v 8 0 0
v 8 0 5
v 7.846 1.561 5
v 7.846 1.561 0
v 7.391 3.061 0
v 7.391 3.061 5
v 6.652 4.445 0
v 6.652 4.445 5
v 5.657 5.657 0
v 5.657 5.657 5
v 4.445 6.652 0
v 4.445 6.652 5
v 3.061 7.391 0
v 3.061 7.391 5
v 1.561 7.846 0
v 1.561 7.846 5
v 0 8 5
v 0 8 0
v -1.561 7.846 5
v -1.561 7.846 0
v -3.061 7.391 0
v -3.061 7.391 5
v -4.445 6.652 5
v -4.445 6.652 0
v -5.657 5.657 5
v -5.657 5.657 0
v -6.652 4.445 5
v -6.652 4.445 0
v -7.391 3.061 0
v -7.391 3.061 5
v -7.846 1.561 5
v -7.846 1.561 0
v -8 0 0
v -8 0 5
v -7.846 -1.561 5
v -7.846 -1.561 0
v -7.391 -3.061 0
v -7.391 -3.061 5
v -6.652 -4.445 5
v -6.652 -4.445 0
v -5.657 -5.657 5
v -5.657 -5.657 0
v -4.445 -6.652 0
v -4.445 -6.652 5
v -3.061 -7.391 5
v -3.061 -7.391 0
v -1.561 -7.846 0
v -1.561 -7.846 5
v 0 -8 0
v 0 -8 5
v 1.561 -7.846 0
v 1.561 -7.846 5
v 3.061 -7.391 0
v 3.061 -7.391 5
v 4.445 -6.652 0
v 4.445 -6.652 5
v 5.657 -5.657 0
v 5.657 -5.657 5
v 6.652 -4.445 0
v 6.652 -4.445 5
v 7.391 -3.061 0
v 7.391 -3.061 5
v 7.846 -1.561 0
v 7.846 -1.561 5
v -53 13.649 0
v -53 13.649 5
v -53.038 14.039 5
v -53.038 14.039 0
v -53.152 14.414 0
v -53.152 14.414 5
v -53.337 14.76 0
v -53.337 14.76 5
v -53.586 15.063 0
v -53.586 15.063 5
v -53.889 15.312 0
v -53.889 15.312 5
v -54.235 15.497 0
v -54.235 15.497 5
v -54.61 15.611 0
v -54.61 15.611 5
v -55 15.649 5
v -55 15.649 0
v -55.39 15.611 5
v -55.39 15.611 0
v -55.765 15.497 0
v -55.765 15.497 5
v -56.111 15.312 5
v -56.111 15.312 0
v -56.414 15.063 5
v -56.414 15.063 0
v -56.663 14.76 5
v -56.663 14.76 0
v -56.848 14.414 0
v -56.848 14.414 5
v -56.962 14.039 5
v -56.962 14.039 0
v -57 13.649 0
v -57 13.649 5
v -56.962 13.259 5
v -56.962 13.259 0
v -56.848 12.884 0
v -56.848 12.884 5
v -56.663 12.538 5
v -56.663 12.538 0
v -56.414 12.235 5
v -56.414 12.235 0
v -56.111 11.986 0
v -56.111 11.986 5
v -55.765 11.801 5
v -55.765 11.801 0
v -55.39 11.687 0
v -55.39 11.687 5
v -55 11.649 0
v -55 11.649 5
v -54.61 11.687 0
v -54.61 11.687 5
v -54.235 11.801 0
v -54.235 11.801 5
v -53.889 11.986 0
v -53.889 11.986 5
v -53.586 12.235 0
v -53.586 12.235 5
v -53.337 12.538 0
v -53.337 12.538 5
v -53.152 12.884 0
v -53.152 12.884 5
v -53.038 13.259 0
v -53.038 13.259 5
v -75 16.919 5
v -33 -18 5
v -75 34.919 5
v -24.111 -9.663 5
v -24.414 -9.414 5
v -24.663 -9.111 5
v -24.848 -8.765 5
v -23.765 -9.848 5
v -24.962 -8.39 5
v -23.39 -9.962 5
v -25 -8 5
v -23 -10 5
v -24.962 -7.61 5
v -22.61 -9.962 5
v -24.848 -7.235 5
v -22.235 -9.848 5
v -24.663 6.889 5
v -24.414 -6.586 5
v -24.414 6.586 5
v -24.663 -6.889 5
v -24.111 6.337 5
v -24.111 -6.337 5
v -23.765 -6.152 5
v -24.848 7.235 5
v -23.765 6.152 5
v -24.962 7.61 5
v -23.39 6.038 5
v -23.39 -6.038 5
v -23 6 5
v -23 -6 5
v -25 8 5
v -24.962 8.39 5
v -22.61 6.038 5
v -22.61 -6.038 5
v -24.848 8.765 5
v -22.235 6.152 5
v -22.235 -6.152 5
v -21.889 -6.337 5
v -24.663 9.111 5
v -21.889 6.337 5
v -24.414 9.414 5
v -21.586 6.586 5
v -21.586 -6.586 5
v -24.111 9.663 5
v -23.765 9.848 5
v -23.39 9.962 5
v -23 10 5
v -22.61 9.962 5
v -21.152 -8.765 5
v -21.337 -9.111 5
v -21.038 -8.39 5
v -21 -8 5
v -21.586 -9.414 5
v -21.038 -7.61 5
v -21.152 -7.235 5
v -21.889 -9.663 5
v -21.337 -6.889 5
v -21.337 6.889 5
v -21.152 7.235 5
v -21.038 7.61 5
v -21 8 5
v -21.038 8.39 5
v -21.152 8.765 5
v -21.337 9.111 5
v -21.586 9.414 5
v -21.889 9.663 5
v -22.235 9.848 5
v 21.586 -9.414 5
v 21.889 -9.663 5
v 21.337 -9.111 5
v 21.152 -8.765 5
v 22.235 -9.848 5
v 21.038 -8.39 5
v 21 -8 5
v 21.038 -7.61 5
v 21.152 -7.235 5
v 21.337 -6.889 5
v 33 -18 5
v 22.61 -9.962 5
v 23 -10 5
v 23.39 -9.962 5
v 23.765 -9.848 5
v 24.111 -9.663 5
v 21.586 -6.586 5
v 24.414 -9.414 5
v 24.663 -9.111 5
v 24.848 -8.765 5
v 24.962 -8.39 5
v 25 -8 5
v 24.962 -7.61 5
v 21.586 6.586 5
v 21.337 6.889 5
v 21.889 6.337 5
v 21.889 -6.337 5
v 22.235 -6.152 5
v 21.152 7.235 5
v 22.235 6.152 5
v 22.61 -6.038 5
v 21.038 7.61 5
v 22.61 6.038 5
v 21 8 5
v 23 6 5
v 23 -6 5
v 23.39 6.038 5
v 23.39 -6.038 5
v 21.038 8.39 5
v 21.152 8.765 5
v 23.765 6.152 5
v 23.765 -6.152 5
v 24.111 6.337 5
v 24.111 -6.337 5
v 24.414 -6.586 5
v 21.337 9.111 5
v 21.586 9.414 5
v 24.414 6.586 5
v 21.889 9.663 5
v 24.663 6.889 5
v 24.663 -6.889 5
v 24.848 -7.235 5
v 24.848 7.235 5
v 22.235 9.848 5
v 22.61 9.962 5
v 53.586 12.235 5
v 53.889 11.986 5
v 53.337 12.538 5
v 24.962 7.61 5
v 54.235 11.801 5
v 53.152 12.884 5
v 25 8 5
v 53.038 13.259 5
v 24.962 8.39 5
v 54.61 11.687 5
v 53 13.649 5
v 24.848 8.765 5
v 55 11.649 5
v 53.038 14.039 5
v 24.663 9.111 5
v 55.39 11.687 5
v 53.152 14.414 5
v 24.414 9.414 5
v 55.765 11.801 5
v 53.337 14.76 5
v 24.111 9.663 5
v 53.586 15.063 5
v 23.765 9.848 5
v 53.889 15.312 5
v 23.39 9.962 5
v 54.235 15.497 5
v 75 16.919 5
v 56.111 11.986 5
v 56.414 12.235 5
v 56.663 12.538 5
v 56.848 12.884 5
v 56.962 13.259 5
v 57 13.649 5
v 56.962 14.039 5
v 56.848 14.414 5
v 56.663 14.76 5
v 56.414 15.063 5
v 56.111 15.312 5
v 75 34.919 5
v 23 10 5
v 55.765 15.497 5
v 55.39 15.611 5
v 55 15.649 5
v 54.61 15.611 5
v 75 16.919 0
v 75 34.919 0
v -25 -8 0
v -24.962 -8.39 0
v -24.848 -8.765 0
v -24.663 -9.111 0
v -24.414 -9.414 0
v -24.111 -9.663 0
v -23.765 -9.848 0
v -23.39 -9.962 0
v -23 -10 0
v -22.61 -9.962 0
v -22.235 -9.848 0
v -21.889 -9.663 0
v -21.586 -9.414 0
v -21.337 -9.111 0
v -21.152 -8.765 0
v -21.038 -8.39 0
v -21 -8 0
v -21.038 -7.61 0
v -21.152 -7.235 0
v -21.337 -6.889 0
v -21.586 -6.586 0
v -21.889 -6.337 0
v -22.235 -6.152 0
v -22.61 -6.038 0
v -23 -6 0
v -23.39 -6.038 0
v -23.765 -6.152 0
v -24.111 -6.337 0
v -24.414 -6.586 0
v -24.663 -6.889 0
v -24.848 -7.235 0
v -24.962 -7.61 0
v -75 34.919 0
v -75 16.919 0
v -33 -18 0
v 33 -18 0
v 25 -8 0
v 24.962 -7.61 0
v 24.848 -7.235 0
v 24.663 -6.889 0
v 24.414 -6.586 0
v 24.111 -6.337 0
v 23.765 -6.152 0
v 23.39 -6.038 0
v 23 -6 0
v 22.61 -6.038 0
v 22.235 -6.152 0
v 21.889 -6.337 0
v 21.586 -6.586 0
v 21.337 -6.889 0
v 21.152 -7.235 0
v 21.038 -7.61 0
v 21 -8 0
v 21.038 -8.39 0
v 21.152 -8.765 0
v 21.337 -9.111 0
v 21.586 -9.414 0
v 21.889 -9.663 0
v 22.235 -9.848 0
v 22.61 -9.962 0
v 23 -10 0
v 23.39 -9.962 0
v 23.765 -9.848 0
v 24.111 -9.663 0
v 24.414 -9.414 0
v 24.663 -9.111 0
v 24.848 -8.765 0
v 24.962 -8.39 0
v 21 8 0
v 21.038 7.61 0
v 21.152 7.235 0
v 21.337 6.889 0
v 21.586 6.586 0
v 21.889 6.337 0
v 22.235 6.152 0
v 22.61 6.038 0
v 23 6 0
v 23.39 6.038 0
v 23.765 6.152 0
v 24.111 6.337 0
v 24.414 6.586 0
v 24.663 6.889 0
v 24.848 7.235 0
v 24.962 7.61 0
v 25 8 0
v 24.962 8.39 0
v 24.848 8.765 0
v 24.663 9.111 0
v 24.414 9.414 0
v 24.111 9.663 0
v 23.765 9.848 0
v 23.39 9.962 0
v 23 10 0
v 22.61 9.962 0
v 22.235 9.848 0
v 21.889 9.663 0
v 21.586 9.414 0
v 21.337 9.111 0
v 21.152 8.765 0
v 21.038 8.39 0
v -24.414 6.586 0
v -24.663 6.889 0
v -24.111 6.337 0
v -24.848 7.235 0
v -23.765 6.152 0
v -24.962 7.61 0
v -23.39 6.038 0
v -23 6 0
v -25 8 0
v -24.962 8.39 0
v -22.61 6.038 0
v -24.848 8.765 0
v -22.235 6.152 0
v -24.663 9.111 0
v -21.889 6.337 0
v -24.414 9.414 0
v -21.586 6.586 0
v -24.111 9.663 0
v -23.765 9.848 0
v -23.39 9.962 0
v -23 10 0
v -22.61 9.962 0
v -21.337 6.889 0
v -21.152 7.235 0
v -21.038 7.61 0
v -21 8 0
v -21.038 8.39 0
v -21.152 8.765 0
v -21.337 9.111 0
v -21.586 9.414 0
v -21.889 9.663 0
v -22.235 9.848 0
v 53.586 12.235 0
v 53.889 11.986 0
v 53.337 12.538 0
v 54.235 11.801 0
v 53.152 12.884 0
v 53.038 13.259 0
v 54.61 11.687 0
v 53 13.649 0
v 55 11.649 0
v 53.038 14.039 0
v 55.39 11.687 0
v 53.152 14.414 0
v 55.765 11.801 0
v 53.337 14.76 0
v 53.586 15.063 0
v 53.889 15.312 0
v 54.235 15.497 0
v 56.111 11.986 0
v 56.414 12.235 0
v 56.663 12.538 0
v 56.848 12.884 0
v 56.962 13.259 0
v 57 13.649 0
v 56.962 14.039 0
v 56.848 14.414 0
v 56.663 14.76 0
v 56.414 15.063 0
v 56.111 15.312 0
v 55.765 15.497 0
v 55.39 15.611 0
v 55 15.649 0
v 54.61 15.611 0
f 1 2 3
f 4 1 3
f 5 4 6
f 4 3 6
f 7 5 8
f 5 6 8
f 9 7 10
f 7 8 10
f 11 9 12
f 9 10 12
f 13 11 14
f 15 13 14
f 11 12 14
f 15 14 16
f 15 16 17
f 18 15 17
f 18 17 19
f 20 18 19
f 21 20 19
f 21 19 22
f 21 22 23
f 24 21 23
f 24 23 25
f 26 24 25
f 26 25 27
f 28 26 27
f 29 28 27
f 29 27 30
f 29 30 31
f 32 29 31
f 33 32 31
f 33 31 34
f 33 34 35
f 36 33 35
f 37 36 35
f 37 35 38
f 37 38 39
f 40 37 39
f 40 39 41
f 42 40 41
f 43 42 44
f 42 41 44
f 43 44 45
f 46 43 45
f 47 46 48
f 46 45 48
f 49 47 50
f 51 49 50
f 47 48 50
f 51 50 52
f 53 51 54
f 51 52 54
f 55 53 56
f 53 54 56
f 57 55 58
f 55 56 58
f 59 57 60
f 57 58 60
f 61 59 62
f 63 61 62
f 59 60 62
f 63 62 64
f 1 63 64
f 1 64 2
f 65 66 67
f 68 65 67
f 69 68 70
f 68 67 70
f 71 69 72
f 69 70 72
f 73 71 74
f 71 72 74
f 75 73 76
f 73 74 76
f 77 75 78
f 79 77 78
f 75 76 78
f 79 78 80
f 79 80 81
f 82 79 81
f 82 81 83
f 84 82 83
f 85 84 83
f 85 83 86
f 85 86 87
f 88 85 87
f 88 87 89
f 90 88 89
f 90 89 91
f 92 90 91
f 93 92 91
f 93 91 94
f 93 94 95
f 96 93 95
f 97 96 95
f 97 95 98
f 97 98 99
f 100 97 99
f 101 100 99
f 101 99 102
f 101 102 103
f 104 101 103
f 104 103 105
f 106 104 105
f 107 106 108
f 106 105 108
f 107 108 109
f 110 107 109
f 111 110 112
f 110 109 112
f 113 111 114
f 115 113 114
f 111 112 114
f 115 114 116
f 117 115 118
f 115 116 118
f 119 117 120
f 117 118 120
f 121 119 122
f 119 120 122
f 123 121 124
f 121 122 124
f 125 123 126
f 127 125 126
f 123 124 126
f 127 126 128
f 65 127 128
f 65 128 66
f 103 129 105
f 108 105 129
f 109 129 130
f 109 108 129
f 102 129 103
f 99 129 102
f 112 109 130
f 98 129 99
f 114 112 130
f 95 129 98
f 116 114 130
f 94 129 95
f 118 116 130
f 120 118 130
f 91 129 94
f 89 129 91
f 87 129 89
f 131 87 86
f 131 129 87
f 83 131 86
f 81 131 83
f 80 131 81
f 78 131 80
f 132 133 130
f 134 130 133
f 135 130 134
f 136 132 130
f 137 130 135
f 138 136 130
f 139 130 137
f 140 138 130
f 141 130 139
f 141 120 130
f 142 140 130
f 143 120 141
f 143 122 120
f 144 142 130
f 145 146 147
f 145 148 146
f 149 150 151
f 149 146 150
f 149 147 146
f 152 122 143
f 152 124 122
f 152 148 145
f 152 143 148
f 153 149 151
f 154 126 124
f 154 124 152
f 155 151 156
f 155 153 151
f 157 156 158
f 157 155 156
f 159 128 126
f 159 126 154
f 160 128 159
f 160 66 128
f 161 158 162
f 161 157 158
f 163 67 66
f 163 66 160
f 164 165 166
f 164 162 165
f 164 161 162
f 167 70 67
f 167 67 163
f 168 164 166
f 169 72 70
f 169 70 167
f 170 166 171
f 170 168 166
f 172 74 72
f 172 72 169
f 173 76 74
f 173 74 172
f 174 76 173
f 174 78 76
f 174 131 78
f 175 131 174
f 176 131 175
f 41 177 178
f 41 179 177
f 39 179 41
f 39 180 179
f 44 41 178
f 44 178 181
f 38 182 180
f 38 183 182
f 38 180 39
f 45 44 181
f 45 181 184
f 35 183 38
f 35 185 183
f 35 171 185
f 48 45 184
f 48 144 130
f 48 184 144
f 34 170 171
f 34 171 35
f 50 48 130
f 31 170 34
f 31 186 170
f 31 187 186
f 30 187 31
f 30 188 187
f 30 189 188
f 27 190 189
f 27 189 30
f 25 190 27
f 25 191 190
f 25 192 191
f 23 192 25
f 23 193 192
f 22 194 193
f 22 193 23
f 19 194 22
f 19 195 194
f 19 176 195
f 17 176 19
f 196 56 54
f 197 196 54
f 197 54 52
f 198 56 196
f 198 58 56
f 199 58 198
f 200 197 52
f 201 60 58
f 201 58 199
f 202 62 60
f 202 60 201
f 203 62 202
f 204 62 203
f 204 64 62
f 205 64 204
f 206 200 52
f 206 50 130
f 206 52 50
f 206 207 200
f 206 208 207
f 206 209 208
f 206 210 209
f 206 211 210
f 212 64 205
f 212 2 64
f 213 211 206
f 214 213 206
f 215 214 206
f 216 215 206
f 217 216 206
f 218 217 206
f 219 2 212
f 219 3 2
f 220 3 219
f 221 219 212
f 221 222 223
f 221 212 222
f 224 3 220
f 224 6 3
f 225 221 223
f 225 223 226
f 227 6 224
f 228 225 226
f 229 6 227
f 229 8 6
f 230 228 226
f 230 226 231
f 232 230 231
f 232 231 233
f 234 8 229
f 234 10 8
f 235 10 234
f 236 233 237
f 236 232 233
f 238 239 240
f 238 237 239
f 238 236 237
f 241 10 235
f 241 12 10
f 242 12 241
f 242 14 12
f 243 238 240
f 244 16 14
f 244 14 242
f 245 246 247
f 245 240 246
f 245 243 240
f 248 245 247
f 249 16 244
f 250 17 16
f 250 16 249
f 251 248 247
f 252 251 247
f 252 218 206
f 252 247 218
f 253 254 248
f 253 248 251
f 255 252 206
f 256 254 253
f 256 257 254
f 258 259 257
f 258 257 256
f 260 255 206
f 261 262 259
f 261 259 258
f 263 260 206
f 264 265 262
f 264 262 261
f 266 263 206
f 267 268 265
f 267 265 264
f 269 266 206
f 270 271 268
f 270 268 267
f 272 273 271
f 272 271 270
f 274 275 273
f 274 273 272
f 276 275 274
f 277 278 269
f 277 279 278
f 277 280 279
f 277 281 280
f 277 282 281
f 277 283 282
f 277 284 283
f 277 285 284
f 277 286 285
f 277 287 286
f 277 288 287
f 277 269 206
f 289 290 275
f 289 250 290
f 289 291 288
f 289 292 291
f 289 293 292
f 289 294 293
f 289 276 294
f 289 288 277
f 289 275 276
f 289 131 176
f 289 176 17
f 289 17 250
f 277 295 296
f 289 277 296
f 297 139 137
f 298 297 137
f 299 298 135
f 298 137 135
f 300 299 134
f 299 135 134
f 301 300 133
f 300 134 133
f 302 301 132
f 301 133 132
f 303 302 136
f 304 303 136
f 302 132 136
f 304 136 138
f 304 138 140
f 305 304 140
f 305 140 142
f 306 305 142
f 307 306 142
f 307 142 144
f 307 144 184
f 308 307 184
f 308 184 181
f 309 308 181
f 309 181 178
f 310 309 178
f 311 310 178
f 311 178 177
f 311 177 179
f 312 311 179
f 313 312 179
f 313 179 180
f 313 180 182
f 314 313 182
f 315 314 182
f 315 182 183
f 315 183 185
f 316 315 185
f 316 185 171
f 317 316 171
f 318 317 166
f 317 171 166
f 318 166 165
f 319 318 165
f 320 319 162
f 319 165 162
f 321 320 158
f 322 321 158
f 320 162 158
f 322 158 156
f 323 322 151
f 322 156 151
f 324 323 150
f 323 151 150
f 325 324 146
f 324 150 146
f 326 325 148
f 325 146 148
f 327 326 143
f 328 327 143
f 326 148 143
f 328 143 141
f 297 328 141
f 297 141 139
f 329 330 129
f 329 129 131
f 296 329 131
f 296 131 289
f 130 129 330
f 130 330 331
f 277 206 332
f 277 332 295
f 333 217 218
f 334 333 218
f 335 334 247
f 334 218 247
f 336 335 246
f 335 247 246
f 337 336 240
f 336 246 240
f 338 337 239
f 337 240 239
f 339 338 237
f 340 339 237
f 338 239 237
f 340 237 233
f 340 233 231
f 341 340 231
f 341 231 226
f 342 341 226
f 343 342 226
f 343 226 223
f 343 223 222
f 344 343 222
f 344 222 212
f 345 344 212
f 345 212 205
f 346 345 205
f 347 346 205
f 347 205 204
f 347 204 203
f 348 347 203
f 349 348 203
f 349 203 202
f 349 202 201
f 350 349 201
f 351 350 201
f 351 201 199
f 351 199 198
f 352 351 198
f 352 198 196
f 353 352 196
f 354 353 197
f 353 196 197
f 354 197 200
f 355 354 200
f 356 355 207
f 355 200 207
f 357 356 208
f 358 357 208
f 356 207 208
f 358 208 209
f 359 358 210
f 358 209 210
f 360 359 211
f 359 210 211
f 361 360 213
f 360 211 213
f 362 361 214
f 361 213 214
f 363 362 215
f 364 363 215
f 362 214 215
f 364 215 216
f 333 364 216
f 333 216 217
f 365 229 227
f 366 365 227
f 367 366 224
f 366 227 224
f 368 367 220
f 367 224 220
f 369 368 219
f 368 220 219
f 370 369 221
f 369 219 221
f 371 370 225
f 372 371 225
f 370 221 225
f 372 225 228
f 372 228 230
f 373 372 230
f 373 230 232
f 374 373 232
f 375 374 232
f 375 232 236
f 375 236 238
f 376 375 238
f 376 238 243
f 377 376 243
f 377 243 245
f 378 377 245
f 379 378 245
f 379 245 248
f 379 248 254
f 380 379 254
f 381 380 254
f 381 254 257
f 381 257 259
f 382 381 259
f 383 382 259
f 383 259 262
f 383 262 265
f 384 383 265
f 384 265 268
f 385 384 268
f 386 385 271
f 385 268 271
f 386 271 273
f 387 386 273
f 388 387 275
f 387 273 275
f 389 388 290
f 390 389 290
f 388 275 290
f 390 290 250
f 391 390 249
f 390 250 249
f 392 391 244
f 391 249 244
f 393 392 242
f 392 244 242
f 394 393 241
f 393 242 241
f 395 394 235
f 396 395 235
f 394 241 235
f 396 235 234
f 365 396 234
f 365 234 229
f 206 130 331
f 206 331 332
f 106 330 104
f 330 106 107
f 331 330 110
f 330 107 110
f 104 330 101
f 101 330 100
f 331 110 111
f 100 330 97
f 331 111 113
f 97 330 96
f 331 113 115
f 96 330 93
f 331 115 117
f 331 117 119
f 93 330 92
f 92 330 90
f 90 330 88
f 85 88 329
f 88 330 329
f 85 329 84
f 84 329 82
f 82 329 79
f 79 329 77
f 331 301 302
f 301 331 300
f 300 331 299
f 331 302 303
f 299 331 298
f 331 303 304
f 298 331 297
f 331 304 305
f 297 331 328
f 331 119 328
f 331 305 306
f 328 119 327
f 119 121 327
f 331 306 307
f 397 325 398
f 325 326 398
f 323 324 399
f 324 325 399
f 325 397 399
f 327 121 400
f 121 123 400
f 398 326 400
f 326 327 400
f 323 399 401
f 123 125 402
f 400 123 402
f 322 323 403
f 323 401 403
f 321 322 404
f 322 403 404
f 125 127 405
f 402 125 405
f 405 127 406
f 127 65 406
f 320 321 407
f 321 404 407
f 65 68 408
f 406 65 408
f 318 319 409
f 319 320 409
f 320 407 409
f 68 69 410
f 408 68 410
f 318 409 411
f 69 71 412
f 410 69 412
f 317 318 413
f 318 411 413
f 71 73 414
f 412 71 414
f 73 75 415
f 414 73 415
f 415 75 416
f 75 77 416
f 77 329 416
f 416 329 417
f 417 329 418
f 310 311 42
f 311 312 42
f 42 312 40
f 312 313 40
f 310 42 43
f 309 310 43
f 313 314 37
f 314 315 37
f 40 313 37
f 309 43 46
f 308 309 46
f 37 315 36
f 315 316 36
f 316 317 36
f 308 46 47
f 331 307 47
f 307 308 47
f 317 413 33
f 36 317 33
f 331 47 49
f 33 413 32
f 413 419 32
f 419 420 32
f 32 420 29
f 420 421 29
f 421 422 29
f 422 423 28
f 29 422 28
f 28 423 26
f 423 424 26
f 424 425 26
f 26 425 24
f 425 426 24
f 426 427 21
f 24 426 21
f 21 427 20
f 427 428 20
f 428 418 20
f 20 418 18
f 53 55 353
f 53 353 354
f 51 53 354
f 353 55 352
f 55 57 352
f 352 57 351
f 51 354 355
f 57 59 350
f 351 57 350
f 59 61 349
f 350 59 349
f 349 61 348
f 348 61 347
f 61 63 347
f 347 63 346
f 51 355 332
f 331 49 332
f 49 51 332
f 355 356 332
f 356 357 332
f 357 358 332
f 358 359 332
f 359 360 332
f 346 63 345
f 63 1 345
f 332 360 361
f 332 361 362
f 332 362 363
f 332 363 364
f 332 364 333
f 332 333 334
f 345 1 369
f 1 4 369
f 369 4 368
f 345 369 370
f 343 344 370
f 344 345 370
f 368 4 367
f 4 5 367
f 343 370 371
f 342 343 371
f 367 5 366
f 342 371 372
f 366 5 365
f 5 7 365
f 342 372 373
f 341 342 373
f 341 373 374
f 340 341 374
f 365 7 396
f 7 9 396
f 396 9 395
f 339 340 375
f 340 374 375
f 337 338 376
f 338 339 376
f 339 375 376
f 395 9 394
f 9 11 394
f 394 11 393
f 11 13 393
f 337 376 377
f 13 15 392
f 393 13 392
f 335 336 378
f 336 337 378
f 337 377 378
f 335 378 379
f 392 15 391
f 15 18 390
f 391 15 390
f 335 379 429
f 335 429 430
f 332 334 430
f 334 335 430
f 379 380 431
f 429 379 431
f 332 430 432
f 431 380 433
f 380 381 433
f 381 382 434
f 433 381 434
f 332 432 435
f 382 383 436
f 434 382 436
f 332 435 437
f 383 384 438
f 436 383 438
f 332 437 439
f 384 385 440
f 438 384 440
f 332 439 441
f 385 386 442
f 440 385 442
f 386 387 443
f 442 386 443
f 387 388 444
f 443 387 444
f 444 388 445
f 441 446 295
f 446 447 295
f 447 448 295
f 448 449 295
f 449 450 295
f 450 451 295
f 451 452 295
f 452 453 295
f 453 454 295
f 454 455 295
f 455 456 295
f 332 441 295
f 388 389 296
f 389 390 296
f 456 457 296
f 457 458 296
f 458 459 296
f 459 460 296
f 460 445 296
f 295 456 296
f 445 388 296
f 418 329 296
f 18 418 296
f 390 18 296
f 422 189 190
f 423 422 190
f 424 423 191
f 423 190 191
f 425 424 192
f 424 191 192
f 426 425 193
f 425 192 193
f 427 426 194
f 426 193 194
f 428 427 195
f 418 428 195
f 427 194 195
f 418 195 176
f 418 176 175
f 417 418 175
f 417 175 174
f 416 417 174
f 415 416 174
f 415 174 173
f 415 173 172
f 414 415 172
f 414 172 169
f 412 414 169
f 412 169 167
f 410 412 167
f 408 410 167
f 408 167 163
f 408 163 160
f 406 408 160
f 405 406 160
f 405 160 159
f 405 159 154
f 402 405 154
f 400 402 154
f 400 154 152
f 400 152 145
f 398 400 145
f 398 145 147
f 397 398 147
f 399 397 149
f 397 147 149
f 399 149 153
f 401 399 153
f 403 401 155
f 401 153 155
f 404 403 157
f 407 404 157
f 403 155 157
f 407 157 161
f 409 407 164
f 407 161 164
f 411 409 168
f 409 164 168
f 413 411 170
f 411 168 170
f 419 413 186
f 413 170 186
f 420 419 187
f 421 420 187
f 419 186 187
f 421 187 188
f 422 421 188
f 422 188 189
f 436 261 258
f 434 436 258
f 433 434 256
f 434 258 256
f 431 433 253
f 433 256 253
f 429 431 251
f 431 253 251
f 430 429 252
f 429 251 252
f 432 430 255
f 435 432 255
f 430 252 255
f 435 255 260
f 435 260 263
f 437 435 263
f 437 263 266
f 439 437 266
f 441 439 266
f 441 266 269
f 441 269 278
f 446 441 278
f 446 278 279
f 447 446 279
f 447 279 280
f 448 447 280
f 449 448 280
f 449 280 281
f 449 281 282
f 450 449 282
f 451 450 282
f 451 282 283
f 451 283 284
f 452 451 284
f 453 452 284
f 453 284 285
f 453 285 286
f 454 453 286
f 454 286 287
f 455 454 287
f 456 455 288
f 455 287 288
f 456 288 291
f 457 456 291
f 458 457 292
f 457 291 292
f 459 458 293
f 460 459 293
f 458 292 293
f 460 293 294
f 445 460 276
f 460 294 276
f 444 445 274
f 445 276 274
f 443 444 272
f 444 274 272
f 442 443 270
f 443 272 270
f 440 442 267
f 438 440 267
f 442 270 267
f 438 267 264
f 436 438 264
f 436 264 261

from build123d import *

# Parameters (mm, degrees)
SKETCH_1_W          = 150
SKETCH_1_H          = 70
EXTRUDE_1_DEPTH     = 5
SKETCH_2_R          = 8
CUT_EXTRUDE_1_DEPTH = 83.949769328
SKETCH_3_R          = 2
CUT_EXTRUDE_2_DEPTH = 83.949769328
SKETCH_4_R          = 2
CUT_EXTRUDE_3_DEPTH = 83.949769328
CUT_EXTRUDE_4_DEPTH = 83.949769328


with BuildPart() as part:
    # 스케치1 → 보스-돌출1 (new body)
    with BuildSketch(Plane.XY):
        with Locations((0, -0.080824272)):
            Rectangle(SKETCH_1_W, SKETCH_1_H)
    extrude(amount=EXTRUDE_1_DEPTH)

    # 스케치2 → 컷-돌출1 (cut, through all)
    with BuildSketch(Plane.XY.offset(5)):
        Circle(SKETCH_2_R)
    extrude(amount=-CUT_EXTRUDE_1_DEPTH, mode=Mode.SUBTRACT)

    # 스케치3 → 컷-돌출2 (cut, through all)
    with BuildSketch(Plane.XY.offset(5)):
        with Locations((-23, 8)):
            Circle(SKETCH_3_R)
        with Locations(Location((-23, -8, 0), (0, 0, 180))):
            Circle(SKETCH_3_R)
        with Locations((23, -8)):
            Circle(SKETCH_3_R)
        with Locations(Location((23, 8, 0), (0, 0, 180))):
            Circle(SKETCH_3_R)
    extrude(amount=-CUT_EXTRUDE_2_DEPTH, mode=Mode.SUBTRACT)

    # 스케치4 → 컷-돌출3 (cut, through all)
    with BuildSketch(Plane.XY.offset(5)):
        with Locations((-55, 13.64900919)):
            Circle(SKETCH_4_R)
        with Locations((-65, -25.080824272)):
            Circle(SKETCH_4_R)
        with Locations(Location((65, -25.080824272, 0), (0, 0, 180))):
            Circle(SKETCH_4_R)
        with Locations(Location((55, 13.64900919, 0), (0, 0, 180))):
            Circle(SKETCH_4_R)
    extrude(amount=-CUT_EXTRUDE_3_DEPTH, mode=Mode.SUBTRACT)

    # 스케치5 → 컷-돌출4 (cut, through all)
    with BuildSketch(Plane.XY.offset(5)):
        Polygon((-75, 16.919175728), (-33, -18), (33, -18), (75, 16.919175728), (75, -35.080824272), (-75, -35.080824272), (-75, -27.080824272), align=None)
    extrude(amount=-CUT_EXTRUDE_4_DEPTH, mode=Mode.SUBTRACT)


solid = part.part
